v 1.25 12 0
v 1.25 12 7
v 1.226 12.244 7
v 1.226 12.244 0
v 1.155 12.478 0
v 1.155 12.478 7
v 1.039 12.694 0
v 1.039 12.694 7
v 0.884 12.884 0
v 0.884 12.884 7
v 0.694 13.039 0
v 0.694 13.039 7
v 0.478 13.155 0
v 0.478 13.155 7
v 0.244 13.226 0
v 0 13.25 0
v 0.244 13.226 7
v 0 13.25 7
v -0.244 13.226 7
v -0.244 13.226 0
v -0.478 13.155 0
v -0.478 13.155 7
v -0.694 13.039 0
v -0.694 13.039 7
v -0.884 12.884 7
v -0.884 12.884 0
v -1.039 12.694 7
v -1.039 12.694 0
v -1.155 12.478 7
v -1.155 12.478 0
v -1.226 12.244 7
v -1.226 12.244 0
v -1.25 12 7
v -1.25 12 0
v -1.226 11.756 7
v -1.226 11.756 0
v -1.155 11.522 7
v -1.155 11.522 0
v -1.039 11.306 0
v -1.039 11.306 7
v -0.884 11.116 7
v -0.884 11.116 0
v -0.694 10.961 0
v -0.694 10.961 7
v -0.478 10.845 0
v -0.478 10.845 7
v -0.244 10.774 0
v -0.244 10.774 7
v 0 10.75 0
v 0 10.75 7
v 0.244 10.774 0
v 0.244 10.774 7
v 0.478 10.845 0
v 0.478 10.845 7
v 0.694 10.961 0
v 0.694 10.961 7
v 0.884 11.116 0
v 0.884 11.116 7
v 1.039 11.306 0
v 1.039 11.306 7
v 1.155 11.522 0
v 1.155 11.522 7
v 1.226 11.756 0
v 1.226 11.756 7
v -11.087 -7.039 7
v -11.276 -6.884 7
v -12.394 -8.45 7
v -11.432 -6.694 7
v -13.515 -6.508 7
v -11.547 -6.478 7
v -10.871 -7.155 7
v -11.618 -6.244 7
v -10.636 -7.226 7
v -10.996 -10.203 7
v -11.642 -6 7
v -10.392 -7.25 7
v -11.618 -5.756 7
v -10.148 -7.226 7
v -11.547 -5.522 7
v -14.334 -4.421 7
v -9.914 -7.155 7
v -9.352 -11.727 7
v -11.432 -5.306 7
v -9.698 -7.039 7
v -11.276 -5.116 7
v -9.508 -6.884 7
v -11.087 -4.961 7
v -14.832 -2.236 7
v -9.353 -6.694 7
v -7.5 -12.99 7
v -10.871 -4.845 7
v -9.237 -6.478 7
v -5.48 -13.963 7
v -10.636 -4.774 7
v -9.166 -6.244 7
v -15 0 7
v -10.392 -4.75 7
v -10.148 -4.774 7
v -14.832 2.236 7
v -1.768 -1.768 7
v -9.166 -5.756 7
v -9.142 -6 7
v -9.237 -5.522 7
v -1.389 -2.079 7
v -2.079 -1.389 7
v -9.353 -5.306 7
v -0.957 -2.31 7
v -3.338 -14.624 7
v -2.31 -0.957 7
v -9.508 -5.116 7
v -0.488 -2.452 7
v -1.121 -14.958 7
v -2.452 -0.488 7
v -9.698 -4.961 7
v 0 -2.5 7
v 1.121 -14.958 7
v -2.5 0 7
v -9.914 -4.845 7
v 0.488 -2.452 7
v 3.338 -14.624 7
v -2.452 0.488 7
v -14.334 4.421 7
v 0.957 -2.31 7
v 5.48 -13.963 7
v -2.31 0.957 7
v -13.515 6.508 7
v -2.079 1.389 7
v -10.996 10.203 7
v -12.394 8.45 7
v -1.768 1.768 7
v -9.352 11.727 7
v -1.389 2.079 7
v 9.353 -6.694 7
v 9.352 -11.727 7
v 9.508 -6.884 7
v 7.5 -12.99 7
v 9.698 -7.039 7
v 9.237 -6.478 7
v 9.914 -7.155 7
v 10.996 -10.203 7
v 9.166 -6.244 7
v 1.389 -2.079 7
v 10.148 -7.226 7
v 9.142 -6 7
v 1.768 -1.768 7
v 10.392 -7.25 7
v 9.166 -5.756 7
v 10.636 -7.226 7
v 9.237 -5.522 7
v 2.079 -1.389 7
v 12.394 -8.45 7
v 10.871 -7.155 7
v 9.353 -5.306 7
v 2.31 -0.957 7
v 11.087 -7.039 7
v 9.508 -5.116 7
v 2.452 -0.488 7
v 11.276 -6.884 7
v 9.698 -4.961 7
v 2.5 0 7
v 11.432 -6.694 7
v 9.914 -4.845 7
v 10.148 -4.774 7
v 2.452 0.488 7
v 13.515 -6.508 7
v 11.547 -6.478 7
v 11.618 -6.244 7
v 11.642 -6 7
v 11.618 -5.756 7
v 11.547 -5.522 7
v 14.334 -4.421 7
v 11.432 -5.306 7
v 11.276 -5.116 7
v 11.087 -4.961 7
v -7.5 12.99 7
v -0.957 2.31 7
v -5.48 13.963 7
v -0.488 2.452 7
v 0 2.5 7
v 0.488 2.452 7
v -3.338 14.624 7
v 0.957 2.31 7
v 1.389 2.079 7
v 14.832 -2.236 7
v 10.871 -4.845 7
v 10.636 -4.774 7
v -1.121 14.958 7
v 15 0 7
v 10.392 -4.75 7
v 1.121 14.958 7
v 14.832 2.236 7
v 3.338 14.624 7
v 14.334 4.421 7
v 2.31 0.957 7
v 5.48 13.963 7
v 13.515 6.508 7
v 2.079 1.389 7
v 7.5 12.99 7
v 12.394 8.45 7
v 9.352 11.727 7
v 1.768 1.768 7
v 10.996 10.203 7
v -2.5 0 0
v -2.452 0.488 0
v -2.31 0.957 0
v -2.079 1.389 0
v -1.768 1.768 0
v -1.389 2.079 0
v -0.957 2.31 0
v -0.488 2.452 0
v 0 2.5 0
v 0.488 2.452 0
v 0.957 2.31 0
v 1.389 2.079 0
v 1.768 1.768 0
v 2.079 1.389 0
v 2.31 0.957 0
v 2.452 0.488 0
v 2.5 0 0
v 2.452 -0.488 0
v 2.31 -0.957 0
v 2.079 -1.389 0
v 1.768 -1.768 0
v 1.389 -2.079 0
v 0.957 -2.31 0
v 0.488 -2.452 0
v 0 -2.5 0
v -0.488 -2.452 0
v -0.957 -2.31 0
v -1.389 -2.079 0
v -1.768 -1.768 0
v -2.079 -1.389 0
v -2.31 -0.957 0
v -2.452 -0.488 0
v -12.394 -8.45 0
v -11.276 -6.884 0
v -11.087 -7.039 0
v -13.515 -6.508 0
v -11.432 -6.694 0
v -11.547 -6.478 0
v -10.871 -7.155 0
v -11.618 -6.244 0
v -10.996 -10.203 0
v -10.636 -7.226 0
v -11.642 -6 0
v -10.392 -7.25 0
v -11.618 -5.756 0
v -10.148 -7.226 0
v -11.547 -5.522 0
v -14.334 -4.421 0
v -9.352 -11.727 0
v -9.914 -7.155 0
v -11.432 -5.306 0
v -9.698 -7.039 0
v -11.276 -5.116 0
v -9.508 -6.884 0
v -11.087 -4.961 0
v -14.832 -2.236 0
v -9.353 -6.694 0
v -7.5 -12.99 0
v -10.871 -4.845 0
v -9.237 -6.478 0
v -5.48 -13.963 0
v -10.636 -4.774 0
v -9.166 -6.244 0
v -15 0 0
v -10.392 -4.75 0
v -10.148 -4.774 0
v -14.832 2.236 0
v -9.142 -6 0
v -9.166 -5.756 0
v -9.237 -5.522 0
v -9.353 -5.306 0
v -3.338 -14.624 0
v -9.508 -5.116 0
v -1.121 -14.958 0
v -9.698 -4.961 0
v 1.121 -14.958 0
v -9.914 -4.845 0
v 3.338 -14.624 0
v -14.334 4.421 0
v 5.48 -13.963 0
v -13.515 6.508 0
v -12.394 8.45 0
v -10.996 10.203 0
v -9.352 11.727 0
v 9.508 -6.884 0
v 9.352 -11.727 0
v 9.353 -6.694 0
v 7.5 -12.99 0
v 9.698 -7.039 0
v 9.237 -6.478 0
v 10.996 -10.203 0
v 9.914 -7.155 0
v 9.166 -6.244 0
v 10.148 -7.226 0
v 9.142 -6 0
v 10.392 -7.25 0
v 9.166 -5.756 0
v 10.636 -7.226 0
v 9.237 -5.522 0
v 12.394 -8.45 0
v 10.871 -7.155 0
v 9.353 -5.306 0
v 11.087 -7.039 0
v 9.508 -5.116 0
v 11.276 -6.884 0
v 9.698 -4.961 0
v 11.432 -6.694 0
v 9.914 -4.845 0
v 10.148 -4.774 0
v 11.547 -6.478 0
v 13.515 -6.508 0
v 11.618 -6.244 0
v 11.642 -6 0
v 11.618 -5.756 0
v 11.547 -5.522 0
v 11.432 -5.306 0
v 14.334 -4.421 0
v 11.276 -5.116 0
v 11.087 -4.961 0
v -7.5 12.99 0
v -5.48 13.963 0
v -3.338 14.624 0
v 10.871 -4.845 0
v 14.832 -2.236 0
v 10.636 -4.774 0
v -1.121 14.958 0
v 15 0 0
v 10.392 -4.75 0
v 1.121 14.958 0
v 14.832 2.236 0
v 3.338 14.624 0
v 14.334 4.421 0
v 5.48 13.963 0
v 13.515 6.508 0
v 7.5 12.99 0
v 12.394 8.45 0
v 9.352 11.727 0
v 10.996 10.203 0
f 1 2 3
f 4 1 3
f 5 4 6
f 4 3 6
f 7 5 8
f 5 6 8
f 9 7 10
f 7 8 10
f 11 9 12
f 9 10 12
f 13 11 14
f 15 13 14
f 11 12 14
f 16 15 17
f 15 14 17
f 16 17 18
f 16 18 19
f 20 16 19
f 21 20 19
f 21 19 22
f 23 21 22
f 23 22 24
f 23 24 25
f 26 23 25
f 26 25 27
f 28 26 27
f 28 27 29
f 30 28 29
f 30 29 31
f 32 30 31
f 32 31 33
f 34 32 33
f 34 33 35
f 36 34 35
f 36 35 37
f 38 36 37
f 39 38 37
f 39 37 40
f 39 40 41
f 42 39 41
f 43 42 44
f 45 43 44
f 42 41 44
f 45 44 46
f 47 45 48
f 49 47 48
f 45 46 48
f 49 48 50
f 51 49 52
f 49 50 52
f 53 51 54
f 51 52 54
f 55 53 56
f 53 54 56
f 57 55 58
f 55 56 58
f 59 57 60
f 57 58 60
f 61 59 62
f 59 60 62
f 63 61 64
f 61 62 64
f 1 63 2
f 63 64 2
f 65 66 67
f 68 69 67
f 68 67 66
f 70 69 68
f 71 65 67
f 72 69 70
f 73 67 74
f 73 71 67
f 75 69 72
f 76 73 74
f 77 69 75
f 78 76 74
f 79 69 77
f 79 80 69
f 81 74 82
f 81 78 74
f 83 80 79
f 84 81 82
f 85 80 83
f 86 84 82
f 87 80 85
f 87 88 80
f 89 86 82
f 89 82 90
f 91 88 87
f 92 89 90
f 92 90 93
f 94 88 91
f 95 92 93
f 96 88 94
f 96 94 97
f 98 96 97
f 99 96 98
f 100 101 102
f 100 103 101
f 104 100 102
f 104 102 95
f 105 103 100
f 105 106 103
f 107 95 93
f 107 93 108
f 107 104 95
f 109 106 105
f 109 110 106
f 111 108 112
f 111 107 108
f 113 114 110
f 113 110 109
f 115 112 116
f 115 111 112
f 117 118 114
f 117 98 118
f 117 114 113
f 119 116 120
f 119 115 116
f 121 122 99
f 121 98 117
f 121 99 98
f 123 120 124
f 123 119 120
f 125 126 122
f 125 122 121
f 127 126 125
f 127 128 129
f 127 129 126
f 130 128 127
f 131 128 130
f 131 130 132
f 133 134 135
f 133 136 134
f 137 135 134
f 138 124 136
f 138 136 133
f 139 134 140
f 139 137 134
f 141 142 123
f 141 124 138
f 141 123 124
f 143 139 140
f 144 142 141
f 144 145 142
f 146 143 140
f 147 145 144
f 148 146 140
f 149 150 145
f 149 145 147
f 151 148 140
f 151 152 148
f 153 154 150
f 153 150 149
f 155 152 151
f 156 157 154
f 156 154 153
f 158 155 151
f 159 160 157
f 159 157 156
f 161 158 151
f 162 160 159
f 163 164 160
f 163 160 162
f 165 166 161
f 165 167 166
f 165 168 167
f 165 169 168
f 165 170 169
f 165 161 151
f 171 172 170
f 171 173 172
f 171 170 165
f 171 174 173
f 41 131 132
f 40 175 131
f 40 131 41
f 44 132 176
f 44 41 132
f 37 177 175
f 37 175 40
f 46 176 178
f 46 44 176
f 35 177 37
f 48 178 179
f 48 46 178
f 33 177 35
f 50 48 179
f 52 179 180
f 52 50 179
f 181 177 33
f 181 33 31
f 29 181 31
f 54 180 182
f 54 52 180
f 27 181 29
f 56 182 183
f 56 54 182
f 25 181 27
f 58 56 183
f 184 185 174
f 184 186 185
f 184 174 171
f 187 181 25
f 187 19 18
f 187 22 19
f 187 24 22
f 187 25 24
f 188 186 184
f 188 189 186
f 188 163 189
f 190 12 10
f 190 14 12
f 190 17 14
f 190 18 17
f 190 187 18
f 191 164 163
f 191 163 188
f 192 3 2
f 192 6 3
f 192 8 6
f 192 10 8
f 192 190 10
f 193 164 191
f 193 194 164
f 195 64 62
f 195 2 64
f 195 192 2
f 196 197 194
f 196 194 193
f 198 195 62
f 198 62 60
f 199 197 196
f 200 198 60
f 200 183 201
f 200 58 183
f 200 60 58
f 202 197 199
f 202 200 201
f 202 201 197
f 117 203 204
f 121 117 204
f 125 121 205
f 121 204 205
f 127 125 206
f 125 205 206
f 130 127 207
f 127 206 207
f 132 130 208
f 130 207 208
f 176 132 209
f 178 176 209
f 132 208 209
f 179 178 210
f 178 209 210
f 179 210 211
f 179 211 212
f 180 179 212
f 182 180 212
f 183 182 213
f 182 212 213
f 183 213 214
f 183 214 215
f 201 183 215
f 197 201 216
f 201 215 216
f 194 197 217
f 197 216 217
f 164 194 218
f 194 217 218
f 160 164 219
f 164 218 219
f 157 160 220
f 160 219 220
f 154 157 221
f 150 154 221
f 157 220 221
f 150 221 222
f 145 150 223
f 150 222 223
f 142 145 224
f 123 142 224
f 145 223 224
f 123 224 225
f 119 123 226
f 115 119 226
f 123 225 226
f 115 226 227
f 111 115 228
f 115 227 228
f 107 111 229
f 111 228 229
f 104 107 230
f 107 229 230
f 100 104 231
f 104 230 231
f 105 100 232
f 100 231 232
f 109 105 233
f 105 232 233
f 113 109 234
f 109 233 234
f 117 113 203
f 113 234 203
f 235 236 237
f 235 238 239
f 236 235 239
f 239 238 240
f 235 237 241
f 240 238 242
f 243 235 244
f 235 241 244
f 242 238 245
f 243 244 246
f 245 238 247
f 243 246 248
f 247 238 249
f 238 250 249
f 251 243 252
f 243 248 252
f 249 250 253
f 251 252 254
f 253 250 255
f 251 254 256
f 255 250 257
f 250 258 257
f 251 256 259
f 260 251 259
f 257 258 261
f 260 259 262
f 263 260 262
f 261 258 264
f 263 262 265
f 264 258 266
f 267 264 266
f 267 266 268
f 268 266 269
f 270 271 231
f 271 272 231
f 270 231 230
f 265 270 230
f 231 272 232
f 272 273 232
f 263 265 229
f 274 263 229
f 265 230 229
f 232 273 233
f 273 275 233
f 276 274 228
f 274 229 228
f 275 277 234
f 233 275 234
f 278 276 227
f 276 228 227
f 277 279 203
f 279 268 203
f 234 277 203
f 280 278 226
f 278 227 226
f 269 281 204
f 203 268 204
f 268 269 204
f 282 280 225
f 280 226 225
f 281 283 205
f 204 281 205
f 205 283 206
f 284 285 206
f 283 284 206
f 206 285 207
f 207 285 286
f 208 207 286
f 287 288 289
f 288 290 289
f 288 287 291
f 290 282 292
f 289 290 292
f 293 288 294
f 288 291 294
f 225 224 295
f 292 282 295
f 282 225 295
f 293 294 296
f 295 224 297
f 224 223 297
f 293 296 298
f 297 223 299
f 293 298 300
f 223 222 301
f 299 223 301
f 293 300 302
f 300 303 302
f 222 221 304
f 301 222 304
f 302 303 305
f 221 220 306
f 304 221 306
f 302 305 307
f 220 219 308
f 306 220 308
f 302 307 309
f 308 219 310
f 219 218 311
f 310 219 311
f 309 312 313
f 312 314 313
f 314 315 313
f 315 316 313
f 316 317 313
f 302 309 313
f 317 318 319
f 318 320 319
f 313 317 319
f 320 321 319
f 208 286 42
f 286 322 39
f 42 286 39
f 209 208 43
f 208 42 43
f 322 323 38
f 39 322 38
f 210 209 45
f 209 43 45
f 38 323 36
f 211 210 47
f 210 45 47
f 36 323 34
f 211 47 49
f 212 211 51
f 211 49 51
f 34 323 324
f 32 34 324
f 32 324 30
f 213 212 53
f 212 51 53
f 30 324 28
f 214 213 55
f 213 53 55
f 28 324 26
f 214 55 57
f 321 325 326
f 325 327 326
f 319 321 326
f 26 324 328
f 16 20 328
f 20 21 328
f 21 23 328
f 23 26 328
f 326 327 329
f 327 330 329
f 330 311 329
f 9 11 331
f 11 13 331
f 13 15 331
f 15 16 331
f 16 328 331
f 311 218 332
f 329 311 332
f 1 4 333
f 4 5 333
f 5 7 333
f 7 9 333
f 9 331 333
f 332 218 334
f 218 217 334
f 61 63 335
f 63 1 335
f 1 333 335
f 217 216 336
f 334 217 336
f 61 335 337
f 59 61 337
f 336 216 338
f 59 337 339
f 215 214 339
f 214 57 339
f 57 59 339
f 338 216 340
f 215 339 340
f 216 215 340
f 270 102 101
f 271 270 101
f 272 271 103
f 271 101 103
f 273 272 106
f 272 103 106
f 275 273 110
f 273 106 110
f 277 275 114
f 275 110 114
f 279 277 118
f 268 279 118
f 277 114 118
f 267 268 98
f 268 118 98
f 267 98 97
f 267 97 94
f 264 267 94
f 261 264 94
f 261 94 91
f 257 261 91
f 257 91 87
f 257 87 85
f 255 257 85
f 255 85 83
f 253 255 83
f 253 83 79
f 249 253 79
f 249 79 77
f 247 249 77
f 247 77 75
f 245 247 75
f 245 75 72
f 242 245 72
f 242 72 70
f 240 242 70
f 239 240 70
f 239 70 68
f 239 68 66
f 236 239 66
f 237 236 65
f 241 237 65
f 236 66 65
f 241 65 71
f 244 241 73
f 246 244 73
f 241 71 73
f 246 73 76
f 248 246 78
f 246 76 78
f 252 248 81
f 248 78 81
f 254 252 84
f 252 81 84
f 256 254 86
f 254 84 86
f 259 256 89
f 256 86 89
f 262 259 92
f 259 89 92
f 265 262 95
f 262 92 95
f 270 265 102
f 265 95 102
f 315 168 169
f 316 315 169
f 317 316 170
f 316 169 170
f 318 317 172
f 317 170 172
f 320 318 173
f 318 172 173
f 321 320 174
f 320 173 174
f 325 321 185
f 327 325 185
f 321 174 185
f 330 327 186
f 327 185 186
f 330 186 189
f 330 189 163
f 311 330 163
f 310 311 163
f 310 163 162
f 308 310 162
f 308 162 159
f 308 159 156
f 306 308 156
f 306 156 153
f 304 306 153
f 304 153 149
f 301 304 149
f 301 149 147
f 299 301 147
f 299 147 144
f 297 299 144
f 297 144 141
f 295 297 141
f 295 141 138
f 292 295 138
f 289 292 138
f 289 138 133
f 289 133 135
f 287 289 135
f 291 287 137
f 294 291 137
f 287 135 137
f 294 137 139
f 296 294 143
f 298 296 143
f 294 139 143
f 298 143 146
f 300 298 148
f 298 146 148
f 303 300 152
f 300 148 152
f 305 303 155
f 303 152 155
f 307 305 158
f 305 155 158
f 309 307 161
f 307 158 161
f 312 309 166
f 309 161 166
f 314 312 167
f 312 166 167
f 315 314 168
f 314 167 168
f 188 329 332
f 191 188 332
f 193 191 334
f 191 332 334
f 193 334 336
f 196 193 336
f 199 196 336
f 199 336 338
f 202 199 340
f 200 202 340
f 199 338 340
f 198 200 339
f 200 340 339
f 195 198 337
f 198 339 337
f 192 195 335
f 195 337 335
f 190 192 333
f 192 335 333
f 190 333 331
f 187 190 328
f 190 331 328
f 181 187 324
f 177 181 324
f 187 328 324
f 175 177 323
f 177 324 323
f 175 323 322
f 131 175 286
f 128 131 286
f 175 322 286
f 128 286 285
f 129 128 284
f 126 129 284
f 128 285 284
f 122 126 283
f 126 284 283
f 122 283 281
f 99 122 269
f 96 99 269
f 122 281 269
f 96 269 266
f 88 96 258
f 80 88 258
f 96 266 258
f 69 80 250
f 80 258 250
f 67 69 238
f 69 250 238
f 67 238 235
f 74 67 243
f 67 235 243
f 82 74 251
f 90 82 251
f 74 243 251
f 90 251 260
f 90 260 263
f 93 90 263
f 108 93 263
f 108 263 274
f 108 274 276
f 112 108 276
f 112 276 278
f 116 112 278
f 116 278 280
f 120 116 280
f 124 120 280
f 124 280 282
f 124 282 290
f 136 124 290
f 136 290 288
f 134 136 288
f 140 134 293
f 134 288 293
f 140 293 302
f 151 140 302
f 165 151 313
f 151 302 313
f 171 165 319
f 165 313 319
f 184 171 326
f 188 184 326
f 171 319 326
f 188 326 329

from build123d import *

# Parameters (mm, degrees)
SKETCH1_R           = 15
BOSS_EXTRUDE2_DEPTH = 7
SKETCH2_R           = 2.5
CUT_EXTRUDE1_DEPTH  = 7
SKETCH3_R           = 1.25
CUT_EXTRUDE2_DEPTH  = 23.338307904


with BuildPart() as part:
    # Sketch1 → Boss-Extrude2 (new body)
    with BuildSketch(Plane.XY):
        Circle(SKETCH1_R)
    extrude(amount=BOSS_EXTRUDE2_DEPTH)

    # Sketch2 → Cut-Extrude1 (cut)
    with BuildSketch(Plane(origin=(0, 0, 0), x_dir=(-1, 0, 0), z_dir=(0, 0, -1))):
        Circle(SKETCH2_R)
    extrude(amount=-CUT_EXTRUDE1_DEPTH, mode=Mode.SUBTRACT)

    # Sketch3 → Cut-Extrude2 (cut, through all)
    with BuildSketch(Plane.XY.offset(7)):
        with Locations((0, 12)):
            Circle(SKETCH3_R)
        with Locations((10.392304845, -6)):
            Circle(SKETCH3_R)
        with Locations((-10.392304845, -6)):
            Circle(SKETCH3_R)
    extrude(amount=-CUT_EXTRUDE2_DEPTH, mode=Mode.SUBTRACT)


solid = part.part
